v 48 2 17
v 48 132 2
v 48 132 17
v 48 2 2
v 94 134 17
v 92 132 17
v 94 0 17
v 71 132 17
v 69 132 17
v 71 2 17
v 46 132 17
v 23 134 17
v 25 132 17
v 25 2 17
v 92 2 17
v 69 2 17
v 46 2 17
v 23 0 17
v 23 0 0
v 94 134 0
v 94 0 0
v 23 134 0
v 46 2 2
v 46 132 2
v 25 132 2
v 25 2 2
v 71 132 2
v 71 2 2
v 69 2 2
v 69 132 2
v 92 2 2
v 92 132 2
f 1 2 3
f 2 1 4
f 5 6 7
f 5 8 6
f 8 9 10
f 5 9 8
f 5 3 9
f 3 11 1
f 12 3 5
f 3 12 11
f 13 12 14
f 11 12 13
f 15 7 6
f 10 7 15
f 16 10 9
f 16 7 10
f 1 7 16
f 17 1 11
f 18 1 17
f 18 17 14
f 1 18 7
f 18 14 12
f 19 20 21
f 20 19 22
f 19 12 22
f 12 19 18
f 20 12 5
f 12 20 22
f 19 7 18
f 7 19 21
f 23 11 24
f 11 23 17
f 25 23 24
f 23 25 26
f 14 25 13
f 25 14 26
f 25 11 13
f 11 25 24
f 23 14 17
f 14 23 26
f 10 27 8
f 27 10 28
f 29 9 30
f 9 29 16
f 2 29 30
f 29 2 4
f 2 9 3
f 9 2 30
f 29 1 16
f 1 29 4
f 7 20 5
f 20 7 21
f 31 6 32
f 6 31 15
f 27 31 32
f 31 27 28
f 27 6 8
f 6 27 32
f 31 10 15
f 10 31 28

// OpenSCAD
//How thick should the base be (in mm)?
base_thickness=2;
//How wide should the pocket be / is your HDD?
pocket_width=21;
//How long should the pocket be / is your HDD?
pocket_lenght=130;
//How thick should the wall_thickness be (in mm)?
wall_thickness=2;
//How high should the wall_thickness be (in mm)?
wall_height=15;
//How much pockets do you want?
quantity_of_racks=3;
//Do you want to add a skirt?
skirt_on = "no";// [yes,no]
skirt_width=5;//[1:20]



difference(){
    for(i=[1:quantity_of_racks]){    
        xOffset=(wall_thickness+pocket_width)*i;
        if (skirt_on=="yes"){
            translate([xOffset-skirt_width,-skirt_width,0]){
                cube([pocket_width+2*wall_thickness+2*skirt_width,pocket_lenght+2*wall_thickness+2*skirt_width,            base_thickness]);
            }
        }
        translate([xOffset,0,0]){
            difference(){

            //außen
            cube([2*wall_thickness+pocket_width,2*wall_thickness+pocket_lenght,base_thickness+  wall_height]);

            //innen
            translate([wall_thickness,wall_thickness,base_thickness]){
                cube([pocket_width,pocket_lenght,base_thickness+wall_height]);
                }
            }
        }
    }
}
